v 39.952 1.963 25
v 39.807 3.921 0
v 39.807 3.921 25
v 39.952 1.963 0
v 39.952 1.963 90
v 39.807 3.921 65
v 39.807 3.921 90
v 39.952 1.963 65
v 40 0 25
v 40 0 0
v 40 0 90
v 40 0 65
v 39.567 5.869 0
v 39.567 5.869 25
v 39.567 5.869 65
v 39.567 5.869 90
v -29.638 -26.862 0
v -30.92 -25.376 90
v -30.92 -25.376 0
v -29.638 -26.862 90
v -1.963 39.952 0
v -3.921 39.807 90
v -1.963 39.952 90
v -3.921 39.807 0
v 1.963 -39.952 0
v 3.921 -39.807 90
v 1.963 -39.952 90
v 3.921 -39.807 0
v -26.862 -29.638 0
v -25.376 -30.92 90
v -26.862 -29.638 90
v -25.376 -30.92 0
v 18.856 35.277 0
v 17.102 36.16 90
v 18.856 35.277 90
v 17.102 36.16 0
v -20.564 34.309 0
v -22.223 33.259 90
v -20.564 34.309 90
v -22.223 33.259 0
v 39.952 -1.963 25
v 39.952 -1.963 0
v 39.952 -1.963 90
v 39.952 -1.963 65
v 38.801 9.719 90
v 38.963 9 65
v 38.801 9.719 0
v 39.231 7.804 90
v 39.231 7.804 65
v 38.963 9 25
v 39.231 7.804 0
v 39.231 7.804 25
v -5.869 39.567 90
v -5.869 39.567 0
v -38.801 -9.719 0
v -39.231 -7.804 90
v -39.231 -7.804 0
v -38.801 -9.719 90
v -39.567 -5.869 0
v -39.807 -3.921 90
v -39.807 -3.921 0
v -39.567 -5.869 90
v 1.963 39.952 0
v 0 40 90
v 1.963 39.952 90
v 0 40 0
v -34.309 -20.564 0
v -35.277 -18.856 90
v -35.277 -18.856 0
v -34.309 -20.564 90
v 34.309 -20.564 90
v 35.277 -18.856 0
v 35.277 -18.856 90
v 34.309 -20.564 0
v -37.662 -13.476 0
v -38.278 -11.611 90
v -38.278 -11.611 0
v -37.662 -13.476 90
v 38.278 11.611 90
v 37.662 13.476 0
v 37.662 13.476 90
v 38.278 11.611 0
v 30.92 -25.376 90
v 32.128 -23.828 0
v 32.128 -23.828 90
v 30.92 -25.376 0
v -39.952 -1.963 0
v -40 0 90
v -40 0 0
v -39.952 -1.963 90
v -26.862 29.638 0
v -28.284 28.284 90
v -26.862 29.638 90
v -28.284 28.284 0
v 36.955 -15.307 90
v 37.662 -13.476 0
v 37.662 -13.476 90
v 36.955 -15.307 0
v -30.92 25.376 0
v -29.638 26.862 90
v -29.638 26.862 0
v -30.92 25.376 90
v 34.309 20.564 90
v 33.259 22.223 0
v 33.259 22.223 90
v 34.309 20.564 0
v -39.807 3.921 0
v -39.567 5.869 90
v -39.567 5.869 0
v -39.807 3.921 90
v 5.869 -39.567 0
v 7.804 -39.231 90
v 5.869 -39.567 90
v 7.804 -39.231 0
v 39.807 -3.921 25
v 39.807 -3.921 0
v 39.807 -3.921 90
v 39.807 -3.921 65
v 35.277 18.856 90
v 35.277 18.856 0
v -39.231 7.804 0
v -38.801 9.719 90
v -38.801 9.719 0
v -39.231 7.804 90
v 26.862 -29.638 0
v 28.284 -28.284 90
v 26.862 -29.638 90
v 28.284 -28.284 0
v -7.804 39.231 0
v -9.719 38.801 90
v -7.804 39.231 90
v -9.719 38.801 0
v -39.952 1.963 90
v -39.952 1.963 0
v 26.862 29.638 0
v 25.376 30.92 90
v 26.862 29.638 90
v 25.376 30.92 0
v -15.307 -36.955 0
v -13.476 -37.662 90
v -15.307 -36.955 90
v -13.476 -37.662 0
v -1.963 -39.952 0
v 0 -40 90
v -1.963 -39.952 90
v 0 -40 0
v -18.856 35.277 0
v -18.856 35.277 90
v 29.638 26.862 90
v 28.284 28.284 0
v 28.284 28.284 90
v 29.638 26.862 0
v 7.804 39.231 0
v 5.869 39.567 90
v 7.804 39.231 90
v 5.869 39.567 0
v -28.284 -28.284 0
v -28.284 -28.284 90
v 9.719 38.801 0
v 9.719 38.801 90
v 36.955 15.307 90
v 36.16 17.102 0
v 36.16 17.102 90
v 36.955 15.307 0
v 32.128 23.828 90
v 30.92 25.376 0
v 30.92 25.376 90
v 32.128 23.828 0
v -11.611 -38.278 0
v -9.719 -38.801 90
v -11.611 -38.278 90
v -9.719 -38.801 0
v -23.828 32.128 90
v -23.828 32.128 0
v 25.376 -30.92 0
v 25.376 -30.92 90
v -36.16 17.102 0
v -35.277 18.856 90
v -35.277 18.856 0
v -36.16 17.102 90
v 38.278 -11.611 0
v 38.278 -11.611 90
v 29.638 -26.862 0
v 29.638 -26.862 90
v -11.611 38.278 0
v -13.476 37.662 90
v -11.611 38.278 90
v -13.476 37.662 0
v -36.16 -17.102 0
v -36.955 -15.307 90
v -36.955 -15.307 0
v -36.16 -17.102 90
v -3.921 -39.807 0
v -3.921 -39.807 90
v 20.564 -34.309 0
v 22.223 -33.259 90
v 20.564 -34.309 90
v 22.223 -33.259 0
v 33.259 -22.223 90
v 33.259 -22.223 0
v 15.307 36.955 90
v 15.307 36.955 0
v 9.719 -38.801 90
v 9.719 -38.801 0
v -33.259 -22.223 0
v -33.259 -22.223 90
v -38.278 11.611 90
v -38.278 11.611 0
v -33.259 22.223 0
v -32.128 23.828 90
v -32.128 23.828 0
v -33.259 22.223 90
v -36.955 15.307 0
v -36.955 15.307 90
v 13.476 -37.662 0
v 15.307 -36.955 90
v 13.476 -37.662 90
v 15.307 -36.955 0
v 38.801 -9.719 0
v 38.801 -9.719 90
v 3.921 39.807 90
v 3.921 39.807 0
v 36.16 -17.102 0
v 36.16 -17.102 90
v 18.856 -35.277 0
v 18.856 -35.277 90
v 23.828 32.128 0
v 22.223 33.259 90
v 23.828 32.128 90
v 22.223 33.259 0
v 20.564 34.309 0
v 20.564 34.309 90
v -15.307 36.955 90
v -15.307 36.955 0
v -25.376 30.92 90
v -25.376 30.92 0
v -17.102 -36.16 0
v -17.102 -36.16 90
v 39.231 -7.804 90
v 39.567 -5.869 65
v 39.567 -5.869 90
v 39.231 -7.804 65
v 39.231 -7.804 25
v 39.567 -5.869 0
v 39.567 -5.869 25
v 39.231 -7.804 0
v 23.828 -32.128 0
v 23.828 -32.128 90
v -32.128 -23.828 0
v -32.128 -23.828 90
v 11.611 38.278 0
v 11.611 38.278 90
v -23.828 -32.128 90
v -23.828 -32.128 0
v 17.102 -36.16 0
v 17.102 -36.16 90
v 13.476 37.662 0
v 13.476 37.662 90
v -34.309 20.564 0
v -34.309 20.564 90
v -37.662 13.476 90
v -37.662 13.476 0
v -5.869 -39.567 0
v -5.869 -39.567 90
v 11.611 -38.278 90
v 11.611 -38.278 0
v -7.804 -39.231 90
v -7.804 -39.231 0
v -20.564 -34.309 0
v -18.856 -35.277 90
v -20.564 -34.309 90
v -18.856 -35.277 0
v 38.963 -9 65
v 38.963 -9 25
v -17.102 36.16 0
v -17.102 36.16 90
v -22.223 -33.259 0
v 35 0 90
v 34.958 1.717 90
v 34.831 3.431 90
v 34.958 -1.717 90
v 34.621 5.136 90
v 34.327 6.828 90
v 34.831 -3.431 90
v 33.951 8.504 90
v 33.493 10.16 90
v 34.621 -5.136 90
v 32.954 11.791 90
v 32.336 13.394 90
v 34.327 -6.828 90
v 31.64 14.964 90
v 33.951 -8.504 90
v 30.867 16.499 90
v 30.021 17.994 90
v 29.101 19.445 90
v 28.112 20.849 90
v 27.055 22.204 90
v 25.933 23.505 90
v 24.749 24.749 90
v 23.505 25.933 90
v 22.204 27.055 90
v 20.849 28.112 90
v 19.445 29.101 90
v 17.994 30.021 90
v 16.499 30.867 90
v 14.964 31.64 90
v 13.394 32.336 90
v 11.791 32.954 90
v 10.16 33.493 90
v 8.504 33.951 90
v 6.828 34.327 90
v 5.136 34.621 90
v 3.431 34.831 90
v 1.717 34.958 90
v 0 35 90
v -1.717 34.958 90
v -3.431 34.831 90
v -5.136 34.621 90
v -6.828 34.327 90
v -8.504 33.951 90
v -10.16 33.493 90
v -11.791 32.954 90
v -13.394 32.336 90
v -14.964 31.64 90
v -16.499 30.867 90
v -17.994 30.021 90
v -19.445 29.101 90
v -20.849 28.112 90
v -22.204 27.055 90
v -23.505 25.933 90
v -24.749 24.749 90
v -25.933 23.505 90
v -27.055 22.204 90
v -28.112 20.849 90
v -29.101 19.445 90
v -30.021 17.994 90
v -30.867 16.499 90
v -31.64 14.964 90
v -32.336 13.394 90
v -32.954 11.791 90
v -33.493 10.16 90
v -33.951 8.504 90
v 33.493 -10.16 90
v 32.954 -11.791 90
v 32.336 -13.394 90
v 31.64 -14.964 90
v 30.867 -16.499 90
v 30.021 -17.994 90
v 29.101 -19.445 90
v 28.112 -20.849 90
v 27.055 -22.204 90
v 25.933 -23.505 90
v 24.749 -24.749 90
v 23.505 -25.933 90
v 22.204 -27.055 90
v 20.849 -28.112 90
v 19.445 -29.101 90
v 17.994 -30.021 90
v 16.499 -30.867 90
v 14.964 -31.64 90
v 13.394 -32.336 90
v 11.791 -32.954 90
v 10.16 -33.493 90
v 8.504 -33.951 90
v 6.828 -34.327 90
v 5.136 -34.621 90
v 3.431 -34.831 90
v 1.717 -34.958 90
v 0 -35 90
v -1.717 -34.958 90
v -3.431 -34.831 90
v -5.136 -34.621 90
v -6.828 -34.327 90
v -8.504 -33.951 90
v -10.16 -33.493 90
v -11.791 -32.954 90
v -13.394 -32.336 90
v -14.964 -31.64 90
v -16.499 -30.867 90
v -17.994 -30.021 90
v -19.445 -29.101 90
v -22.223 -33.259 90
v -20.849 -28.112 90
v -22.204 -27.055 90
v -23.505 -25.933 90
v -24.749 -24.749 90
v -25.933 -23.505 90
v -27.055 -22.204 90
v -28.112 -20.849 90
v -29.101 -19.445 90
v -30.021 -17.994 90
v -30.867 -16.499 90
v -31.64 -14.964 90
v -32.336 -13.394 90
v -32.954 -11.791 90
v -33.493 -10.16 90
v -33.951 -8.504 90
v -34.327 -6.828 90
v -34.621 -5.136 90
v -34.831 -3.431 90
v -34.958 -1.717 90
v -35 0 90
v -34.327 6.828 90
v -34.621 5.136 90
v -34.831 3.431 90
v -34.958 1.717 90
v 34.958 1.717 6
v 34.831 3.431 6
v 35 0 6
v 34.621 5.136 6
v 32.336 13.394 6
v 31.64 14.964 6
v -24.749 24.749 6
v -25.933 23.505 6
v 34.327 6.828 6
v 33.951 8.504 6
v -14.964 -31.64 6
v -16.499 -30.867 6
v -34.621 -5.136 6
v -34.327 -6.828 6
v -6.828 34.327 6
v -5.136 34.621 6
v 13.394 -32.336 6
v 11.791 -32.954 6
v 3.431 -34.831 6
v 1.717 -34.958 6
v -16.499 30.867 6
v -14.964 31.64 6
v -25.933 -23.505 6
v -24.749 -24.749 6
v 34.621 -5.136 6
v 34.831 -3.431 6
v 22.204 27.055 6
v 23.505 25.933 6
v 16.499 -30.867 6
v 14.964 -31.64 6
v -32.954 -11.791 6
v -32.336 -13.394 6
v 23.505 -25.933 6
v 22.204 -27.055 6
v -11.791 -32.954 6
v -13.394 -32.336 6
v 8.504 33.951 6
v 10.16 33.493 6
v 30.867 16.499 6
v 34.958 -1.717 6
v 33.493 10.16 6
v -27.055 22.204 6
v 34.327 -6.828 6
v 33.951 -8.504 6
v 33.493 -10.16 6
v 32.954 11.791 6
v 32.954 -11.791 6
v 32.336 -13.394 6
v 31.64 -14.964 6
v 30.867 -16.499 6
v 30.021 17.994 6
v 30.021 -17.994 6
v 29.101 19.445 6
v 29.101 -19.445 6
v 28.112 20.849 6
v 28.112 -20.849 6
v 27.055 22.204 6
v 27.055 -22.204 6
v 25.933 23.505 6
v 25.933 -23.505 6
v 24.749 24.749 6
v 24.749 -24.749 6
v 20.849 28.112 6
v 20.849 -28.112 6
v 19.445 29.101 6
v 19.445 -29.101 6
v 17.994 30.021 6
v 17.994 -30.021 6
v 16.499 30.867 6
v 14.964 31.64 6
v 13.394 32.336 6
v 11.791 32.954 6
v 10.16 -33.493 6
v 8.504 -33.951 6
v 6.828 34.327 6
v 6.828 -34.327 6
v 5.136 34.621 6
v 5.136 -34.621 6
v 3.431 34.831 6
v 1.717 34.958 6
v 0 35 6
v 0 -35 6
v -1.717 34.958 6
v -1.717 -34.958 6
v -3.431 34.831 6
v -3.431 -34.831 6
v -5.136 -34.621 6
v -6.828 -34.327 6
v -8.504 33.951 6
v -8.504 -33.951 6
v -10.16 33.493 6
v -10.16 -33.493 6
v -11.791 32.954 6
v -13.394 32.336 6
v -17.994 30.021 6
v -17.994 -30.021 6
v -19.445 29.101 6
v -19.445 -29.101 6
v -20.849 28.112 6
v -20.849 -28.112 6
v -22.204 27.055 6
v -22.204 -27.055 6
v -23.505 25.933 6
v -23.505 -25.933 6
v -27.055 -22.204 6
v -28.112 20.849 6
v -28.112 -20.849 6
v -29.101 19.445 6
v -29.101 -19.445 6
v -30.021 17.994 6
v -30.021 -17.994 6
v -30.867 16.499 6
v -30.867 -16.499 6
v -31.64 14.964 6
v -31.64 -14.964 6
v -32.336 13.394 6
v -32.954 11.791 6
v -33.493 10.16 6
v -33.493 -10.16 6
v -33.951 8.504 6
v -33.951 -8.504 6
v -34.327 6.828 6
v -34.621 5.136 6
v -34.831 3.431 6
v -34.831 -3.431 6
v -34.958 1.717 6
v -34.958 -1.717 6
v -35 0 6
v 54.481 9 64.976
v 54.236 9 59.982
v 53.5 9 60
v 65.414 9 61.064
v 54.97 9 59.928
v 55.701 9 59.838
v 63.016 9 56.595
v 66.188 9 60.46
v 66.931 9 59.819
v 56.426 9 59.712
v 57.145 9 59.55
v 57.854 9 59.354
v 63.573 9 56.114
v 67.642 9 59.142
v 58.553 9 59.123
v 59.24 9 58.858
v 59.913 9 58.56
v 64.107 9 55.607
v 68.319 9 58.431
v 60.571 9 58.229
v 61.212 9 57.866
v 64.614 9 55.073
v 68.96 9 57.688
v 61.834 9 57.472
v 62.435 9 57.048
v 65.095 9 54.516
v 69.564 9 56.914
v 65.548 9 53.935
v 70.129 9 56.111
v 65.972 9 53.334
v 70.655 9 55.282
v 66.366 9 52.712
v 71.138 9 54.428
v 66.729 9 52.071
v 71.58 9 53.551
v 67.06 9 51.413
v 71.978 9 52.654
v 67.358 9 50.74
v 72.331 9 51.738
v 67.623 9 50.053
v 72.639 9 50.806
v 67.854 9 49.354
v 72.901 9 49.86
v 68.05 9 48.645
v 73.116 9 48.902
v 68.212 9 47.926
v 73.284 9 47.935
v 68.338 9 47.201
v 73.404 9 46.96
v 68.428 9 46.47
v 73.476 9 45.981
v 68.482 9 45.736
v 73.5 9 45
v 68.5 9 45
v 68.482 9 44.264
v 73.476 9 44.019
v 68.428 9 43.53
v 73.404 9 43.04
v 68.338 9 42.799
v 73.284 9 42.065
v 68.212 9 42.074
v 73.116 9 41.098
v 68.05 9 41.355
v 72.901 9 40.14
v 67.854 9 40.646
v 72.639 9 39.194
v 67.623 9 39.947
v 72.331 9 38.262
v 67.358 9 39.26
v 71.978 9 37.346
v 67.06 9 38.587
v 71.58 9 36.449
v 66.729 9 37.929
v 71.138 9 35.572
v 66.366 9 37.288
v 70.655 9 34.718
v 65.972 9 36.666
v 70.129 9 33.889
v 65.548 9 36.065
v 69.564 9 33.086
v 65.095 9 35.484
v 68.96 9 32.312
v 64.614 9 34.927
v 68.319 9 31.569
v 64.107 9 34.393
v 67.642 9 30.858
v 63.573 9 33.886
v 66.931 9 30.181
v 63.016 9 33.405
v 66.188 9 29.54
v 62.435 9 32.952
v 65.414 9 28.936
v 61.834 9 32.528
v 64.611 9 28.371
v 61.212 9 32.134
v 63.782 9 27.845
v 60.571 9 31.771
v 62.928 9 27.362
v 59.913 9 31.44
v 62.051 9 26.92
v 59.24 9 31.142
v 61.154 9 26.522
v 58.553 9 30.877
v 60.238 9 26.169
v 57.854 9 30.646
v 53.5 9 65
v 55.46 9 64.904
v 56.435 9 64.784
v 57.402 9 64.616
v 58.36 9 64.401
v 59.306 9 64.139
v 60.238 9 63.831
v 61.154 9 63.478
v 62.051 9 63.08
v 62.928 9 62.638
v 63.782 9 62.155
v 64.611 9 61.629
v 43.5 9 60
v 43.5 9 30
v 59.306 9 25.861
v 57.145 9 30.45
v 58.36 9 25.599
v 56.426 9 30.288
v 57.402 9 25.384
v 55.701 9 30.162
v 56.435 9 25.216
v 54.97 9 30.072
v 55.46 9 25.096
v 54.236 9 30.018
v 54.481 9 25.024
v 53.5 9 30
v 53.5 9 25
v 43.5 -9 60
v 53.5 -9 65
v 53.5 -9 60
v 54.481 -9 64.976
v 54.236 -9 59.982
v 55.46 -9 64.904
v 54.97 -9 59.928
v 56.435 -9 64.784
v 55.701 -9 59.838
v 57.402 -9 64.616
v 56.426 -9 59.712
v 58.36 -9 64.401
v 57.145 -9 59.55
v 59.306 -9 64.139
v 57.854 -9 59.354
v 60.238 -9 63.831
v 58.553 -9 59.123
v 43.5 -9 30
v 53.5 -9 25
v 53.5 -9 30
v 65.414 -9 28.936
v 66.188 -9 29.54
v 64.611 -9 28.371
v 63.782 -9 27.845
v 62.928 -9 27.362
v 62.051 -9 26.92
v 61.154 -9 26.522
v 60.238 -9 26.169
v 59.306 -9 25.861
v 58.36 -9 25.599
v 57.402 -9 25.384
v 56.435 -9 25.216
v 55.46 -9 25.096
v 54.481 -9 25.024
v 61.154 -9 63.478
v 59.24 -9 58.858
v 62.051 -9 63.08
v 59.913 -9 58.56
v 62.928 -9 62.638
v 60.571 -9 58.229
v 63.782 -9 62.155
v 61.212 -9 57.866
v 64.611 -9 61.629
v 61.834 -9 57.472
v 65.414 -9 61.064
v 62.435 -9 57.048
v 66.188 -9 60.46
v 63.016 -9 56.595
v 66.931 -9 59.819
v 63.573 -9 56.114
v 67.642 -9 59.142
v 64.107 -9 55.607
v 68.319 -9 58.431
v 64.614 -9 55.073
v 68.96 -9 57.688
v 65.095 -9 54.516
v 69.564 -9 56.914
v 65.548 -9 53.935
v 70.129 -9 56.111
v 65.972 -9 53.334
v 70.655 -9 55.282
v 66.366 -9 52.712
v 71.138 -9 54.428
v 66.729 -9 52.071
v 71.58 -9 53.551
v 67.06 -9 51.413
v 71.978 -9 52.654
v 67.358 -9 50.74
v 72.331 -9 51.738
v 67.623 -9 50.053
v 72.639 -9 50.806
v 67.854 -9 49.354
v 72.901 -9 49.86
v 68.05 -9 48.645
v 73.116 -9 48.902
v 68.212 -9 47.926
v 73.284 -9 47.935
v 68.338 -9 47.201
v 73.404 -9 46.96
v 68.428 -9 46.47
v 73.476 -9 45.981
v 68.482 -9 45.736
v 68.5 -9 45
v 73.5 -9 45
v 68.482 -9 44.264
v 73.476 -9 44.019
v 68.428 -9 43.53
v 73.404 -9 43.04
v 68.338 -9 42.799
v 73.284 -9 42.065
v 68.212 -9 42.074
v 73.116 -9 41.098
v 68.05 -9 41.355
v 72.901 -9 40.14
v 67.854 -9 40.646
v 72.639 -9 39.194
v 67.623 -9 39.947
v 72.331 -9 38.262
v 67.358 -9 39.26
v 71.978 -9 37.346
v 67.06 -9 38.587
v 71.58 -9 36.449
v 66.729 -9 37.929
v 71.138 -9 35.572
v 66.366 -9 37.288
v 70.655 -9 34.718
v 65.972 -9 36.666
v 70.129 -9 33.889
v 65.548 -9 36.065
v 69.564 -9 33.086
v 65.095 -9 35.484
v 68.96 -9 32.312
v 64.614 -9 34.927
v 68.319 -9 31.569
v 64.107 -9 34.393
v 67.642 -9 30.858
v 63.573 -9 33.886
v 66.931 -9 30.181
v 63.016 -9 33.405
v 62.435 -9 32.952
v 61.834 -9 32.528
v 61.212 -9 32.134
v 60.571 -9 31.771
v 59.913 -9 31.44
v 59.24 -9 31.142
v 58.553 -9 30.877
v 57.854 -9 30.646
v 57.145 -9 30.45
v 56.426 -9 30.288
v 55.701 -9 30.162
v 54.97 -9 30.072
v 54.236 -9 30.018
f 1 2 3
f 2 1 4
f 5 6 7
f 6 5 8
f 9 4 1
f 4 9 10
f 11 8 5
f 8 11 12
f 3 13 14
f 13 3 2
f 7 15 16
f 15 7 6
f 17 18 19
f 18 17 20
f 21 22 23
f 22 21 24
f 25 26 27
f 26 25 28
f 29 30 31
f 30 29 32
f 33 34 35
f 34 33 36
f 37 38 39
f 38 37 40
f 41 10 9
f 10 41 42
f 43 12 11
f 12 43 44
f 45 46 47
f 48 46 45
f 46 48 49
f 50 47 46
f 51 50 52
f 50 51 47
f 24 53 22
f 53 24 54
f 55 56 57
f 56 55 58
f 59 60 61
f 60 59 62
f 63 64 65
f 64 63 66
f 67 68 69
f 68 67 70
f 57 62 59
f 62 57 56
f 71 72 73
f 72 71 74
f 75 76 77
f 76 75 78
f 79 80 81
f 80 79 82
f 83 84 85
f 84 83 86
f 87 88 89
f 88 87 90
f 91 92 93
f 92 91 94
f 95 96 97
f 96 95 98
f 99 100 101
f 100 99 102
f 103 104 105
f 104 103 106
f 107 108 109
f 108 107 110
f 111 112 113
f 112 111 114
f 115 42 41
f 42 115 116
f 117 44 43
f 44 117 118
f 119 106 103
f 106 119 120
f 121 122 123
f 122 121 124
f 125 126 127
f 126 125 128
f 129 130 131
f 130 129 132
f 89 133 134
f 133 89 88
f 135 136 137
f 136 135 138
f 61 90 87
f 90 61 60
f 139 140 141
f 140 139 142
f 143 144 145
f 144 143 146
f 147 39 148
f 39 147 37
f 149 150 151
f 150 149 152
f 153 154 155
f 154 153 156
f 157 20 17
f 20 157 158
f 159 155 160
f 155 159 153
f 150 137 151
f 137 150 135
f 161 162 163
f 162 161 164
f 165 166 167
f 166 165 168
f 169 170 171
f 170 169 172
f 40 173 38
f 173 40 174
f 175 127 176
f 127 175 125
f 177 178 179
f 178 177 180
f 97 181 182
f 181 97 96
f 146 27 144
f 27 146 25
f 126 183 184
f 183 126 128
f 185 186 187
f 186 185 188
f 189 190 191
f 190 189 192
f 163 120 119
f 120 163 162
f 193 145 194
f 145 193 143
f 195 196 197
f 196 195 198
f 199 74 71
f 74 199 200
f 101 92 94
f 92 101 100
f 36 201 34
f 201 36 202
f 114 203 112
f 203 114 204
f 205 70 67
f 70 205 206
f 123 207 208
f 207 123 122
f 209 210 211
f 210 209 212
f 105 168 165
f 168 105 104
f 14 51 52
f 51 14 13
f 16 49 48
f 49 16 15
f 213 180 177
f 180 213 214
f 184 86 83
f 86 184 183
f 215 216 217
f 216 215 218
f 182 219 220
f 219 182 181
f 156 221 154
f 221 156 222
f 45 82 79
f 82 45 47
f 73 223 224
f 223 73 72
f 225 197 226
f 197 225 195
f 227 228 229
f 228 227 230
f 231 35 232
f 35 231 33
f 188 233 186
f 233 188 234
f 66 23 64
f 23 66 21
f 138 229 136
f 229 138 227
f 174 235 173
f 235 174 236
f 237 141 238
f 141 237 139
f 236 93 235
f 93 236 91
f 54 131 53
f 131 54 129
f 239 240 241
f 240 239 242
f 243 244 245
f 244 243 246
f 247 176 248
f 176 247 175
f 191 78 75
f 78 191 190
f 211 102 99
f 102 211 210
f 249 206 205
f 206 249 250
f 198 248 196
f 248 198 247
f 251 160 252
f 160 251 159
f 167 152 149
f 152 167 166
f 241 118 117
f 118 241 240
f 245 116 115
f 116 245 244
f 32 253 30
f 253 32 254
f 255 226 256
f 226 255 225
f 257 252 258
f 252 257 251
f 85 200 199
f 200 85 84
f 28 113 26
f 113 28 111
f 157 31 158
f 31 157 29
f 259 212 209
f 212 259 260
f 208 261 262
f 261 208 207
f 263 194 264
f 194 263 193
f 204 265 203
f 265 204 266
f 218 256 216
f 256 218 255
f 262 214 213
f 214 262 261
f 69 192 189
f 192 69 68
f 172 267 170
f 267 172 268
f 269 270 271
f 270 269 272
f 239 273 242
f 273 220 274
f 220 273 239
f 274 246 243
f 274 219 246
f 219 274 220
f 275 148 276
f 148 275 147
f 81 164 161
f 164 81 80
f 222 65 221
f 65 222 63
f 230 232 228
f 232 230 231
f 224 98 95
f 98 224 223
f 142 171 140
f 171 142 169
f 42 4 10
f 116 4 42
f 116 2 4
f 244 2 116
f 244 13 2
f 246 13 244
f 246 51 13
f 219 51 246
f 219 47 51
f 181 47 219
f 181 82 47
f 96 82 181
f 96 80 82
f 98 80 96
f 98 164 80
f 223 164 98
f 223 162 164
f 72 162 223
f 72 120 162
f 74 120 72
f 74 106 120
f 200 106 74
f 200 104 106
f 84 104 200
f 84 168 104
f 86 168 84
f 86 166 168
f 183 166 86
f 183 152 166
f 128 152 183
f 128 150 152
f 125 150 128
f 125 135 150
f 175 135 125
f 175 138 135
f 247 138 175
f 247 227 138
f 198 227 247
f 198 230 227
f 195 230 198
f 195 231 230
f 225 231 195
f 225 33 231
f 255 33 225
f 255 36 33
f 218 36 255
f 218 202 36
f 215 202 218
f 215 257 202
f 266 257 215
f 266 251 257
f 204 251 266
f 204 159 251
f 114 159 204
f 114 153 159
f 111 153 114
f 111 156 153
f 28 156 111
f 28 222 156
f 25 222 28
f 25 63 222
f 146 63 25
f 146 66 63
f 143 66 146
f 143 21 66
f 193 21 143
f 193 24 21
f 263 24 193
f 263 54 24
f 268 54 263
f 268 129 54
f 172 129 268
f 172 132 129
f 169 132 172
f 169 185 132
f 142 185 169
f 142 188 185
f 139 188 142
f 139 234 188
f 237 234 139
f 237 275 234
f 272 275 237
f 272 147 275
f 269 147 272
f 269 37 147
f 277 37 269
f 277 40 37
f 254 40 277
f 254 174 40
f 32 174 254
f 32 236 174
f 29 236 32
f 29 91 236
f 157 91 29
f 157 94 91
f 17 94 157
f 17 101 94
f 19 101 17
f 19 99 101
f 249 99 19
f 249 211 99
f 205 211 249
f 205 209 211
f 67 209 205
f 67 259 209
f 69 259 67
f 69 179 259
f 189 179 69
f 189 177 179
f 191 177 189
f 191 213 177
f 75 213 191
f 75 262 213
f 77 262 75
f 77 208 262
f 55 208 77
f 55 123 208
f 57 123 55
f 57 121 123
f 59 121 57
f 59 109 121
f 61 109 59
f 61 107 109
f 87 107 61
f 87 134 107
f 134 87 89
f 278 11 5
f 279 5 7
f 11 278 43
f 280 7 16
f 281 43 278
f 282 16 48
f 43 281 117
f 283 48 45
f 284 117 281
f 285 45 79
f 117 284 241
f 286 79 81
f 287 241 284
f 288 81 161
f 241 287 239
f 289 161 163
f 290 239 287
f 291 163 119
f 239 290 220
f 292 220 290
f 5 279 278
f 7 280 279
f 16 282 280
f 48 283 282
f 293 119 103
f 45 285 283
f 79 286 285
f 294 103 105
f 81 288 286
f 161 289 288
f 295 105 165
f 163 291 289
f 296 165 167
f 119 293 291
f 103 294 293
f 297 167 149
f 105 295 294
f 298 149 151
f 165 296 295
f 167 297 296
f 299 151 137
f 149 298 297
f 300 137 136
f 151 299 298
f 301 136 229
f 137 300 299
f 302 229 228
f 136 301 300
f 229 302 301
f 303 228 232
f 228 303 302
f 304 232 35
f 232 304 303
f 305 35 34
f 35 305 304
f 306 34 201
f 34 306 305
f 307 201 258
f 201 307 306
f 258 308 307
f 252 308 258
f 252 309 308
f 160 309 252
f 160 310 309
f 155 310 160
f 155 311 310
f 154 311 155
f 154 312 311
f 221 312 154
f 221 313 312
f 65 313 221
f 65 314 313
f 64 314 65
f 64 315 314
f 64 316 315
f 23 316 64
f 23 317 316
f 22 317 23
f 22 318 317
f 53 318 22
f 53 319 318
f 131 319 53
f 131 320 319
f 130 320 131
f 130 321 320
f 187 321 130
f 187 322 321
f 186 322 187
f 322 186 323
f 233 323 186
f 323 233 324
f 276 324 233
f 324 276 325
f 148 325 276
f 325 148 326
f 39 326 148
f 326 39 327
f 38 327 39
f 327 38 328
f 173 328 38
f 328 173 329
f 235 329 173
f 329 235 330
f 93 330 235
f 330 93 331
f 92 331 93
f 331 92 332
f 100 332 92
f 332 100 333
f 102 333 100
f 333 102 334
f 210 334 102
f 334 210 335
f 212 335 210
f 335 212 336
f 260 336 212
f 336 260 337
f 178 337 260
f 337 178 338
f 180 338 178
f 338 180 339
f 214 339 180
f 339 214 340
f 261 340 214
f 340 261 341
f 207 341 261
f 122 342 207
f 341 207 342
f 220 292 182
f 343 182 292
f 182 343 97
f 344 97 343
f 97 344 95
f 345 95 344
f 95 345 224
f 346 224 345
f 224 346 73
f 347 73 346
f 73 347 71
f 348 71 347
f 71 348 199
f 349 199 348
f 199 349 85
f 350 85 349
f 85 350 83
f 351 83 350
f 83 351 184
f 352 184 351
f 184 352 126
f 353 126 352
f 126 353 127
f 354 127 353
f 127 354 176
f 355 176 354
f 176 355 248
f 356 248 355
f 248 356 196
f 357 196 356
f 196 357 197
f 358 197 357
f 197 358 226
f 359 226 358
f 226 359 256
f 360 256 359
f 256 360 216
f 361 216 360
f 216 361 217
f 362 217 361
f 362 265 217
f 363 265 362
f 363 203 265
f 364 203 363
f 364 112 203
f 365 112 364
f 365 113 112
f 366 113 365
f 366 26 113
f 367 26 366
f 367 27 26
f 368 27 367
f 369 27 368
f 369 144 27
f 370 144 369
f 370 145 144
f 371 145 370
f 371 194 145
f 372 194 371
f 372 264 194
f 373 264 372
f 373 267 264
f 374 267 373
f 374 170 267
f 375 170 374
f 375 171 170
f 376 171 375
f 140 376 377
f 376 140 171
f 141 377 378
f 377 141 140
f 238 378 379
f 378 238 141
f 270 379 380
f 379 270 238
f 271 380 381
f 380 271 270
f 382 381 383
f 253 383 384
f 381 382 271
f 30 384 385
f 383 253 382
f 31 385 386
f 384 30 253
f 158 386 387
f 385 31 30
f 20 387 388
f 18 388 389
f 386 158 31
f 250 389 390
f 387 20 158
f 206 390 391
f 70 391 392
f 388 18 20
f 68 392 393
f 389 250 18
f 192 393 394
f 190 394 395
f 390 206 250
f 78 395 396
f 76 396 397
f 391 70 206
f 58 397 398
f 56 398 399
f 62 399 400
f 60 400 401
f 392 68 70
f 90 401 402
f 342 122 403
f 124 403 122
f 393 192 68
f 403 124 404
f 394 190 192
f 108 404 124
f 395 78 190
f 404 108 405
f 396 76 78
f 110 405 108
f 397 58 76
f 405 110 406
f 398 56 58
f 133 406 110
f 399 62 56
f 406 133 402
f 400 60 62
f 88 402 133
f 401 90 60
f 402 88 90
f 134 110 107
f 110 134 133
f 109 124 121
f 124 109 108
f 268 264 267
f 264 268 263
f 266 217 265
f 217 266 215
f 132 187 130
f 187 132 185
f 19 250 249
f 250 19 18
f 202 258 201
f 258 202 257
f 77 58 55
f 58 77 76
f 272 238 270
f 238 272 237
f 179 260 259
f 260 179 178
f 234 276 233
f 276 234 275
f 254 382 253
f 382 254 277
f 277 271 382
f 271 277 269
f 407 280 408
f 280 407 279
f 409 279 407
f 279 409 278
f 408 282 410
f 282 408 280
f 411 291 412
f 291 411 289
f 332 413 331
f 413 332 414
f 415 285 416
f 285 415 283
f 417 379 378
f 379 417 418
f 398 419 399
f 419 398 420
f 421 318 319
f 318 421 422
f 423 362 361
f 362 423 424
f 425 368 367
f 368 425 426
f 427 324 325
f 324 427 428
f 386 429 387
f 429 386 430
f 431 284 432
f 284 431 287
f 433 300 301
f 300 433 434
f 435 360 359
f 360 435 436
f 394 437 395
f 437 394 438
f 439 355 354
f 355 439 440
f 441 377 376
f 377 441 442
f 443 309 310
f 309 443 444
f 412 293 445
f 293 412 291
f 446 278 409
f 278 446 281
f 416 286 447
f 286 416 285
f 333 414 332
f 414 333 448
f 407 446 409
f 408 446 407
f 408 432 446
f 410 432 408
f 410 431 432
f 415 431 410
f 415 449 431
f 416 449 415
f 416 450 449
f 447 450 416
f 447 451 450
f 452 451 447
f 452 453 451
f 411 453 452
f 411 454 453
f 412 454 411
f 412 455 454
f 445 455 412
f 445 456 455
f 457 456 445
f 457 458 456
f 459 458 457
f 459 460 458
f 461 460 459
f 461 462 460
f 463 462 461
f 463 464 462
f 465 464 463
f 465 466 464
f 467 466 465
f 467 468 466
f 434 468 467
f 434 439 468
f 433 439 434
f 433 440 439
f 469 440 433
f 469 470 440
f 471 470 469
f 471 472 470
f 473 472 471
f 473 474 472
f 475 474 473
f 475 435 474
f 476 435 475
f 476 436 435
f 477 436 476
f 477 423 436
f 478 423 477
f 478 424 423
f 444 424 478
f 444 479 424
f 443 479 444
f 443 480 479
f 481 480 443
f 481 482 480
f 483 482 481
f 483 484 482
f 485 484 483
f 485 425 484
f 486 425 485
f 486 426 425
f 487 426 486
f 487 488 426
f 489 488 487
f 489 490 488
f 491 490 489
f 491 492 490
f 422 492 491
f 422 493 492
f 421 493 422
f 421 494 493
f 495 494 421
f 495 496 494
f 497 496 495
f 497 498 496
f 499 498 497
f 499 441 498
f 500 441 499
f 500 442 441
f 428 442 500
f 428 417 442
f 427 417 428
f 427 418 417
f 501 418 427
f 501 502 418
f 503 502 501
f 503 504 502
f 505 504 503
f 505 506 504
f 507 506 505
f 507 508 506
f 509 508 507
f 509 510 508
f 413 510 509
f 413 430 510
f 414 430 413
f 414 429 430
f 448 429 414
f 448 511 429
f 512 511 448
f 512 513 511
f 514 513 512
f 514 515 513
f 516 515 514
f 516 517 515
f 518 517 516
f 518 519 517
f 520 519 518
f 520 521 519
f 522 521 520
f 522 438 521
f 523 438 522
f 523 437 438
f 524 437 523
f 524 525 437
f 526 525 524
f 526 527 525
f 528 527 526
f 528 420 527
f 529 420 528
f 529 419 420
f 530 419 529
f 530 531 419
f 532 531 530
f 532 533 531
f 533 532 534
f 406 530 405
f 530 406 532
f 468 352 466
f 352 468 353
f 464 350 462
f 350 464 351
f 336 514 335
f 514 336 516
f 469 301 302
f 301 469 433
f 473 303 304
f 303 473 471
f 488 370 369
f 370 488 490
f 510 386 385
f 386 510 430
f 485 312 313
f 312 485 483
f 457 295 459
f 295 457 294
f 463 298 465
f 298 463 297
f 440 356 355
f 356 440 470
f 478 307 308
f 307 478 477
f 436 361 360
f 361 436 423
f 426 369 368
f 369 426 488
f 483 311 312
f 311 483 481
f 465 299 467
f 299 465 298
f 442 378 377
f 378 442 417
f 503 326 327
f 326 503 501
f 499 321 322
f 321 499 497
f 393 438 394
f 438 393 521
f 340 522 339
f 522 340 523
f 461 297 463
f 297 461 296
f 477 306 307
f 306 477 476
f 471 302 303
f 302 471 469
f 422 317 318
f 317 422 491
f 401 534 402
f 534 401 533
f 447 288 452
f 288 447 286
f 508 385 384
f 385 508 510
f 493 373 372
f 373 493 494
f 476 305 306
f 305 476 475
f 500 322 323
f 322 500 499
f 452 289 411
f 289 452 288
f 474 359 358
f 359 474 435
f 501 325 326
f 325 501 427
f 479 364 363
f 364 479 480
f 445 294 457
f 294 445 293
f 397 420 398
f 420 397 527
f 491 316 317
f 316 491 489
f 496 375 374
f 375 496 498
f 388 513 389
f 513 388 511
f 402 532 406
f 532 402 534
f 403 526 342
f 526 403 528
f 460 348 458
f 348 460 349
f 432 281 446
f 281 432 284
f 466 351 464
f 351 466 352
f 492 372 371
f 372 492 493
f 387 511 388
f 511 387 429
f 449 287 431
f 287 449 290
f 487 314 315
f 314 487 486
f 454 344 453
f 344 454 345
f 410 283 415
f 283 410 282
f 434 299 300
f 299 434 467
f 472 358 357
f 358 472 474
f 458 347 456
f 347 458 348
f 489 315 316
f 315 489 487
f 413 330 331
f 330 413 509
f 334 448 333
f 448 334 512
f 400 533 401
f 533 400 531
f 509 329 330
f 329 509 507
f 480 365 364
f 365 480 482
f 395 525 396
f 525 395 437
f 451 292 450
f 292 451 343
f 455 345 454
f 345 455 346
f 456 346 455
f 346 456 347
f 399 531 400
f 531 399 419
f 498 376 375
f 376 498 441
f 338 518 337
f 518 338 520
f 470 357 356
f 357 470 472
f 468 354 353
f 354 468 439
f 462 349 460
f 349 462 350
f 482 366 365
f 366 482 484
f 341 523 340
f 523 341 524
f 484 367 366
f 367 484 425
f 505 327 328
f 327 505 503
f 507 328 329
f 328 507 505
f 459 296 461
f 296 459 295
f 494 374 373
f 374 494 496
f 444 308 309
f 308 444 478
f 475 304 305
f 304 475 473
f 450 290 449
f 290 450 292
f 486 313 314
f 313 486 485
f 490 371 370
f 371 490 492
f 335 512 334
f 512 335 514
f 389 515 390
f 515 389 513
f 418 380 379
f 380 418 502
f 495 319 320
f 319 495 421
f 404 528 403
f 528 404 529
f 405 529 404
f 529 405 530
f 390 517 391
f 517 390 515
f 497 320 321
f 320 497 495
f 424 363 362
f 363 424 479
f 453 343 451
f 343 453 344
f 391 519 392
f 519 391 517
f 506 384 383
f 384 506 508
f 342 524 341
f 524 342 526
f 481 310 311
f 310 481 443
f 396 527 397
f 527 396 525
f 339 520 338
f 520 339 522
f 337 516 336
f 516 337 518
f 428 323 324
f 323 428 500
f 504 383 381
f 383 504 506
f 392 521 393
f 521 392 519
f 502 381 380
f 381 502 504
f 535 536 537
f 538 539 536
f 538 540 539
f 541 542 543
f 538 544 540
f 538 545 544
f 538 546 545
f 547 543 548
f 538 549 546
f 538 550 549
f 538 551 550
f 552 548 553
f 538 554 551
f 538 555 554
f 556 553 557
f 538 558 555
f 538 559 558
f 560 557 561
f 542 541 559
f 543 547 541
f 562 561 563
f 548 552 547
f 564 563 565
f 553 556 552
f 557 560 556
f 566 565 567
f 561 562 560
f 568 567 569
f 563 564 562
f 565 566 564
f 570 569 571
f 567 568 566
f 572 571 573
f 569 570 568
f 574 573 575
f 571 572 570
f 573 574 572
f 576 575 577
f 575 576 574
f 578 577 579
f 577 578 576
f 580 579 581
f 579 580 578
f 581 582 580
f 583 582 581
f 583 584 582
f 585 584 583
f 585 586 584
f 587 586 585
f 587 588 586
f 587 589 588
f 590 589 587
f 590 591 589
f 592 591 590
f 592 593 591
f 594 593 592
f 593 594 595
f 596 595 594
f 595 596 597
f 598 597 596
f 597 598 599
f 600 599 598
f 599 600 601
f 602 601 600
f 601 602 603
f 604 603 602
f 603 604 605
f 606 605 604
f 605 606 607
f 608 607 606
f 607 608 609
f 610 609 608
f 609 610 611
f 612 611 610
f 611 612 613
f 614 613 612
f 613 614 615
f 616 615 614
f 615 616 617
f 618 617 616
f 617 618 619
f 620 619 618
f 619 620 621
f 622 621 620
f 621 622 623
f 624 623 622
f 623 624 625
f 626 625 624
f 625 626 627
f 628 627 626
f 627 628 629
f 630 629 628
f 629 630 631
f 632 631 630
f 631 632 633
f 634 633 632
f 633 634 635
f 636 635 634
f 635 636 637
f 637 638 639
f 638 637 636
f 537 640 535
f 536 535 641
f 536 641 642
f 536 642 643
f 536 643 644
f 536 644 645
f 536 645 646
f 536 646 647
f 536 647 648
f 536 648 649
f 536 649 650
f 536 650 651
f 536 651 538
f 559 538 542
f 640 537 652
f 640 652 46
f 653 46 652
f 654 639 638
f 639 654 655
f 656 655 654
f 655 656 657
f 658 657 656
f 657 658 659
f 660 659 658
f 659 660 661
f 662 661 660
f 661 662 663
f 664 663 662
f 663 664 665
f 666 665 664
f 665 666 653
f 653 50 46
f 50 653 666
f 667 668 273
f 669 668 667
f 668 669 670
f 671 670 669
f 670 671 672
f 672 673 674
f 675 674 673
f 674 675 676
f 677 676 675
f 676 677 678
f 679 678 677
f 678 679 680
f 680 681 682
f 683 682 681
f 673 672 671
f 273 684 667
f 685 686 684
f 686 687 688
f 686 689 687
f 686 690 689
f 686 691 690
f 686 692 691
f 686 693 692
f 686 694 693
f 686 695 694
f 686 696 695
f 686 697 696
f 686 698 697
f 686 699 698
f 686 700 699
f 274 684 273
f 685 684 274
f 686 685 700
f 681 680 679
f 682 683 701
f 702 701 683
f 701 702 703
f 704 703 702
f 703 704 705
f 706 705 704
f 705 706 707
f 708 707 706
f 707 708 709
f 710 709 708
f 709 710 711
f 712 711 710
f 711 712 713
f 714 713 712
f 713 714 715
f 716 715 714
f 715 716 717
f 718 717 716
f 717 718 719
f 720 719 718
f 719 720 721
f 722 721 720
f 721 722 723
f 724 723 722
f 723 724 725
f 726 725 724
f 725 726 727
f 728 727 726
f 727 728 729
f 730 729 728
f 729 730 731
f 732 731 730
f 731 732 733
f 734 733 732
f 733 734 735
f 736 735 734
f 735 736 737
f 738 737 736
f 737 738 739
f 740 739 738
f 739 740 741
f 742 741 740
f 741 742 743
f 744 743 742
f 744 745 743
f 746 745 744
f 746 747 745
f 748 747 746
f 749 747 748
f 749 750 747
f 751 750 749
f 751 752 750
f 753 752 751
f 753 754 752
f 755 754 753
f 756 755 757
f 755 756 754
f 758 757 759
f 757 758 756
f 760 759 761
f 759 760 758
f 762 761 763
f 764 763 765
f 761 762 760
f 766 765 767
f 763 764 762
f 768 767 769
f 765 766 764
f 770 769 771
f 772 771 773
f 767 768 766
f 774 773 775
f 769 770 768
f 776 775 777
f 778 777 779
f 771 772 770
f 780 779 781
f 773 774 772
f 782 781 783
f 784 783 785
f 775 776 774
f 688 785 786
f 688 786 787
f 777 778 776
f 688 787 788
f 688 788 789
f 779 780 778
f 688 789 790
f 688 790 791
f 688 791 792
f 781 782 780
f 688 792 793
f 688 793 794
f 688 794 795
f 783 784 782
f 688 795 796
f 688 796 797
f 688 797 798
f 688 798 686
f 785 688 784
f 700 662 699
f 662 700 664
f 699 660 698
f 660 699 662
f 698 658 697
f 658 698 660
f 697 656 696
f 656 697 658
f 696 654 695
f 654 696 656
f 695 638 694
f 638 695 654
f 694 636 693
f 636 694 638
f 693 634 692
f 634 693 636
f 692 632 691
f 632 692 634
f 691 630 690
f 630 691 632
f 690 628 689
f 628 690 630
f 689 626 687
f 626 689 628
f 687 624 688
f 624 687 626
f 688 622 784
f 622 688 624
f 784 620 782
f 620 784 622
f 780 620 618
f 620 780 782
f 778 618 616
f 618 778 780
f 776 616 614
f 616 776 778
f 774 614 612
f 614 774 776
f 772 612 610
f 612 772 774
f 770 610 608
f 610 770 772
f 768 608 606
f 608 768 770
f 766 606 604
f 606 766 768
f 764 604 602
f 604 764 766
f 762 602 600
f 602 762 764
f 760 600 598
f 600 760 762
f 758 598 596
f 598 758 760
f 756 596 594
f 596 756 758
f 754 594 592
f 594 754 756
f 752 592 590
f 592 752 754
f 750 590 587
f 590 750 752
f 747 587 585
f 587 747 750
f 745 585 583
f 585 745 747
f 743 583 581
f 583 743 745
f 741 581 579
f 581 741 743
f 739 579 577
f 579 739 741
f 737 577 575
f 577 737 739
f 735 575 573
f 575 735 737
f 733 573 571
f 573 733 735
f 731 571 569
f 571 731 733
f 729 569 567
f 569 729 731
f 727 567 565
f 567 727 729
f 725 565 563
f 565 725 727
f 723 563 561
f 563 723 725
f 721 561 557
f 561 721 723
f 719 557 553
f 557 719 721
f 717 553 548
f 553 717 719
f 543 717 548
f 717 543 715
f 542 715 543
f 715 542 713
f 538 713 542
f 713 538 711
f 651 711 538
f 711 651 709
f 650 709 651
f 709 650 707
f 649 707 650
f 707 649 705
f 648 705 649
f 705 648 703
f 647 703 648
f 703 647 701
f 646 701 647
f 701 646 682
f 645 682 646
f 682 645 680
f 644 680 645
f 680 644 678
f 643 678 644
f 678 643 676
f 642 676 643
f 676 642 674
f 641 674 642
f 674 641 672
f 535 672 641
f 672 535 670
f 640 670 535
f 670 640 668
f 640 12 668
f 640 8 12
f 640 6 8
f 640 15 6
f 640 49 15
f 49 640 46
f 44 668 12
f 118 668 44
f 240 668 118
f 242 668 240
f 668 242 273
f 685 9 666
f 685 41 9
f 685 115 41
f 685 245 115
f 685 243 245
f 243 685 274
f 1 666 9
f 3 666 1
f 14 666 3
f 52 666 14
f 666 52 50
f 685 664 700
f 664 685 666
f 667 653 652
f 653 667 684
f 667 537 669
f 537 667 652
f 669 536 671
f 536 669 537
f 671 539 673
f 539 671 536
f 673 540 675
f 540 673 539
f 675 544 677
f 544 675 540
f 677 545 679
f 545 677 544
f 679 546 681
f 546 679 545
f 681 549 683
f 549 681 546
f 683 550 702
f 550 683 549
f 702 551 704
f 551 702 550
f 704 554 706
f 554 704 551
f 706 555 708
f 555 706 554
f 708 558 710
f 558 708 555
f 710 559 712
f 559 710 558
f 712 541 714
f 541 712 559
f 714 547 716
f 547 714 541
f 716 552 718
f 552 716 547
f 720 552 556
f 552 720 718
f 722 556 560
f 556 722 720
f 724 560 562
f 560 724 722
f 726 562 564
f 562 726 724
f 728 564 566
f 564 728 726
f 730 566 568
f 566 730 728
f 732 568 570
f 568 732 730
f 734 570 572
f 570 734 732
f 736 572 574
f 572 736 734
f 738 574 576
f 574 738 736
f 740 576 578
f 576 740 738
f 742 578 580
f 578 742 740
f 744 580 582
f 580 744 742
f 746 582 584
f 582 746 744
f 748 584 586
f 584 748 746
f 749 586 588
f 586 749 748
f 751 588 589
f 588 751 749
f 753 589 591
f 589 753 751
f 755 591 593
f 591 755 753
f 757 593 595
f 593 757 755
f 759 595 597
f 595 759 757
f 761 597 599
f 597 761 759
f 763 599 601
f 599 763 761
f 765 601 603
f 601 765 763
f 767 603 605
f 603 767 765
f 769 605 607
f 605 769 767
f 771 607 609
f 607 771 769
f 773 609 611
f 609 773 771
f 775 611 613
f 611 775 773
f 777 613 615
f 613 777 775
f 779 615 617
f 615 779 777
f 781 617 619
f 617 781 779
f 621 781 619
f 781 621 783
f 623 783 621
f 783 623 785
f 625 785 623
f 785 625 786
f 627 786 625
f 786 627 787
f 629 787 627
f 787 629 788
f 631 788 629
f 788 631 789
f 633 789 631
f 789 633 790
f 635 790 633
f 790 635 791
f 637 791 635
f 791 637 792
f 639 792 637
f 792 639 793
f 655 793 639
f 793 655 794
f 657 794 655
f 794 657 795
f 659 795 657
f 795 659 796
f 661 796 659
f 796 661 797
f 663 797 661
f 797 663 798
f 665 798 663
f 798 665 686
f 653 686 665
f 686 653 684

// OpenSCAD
$fn = 128;

module mug_body() {
    outer_height = 90;
    outer_radius = 40;
    inner_radius = 35;
    bottom_thickness = 6;

    difference() {
        cylinder(h = outer_height, r = outer_radius);
        translate([0, 0, bottom_thickness])
            cylinder(h = outer_height - bottom_thickness, r = inner_radius);
    }
}

module mug_handle() {
    handle_wall = 5;
    handle_inner_height = 30;
    handle_inner_width = 25;
    handle_depth = 18;

    inner_radius = handle_inner_height / 2;
    inner_rect_w = handle_inner_width - inner_radius;
    outer_height = handle_inner_height + 2 * handle_wall;
    outer_radius = outer_height / 2;
    outer_rect_w = inner_rect_w + handle_wall;

    module semicircle(radius) {
        intersection() {
            circle(r = radius);
            translate([0, -radius])
                square([radius, 2 * radius], center = false);
        }
    }

    module d_profile(rect_w, height, radius) {
        union() {
            square([rect_w, height], center = false);
            translate([rect_w, height / 2])
                semicircle(radius);
        }
    }

    module handle_2d() {
        difference() {
            d_profile(outer_rect_w, outer_height, outer_radius);
            translate([handle_wall, handle_wall])
                d_profile(inner_rect_w, handle_inner_height, inner_radius);
        }
    }

    translate([38.5, 0, 45])
        rotate([90, 0, 0])
            linear_extrude(height = handle_depth, center = true, convexity = 10)
                translate([0, -outer_height / 2])
                    handle_2d();
}

union() {
    mug_body();
    mug_handle();
}
